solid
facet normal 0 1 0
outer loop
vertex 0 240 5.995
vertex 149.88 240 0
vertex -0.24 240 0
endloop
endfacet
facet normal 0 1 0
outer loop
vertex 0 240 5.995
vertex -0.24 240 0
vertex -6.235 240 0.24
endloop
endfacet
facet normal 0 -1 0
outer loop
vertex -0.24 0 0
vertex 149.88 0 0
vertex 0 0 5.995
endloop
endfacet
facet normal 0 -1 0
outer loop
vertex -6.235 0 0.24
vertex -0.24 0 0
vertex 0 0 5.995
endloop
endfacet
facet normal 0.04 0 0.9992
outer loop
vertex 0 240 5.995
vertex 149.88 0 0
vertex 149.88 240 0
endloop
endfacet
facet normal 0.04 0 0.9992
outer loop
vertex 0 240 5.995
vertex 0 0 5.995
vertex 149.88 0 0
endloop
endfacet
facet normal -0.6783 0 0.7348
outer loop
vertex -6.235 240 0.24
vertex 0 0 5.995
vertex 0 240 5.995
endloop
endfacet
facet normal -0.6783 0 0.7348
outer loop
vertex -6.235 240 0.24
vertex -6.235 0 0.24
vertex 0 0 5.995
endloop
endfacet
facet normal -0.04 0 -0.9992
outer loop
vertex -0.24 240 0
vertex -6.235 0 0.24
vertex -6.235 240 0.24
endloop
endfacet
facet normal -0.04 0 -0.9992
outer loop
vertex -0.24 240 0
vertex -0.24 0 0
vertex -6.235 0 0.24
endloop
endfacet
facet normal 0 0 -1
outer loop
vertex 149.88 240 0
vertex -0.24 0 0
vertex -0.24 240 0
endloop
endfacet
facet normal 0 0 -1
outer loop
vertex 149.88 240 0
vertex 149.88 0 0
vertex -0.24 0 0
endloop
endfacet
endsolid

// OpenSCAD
// bodenplatte.scad
// Side profile: two right triangles sharing a vertical 6 mm edge.
// Red triangle:  top edge 6 mm, vertical edge 6 mm, 90deg between them, hypotenuse y.
// Green triangle: bottom edge 150 mm, vertical edge 6 mm, hypotenuse x (long taper to the tip).
// All units in millimeters.

// ---------- Parameters ----------
base_length = 150;  // bottom edge of the green triangle (V -> tip)
height      = 6;    // shared vertical edge between the two triangles
top_length  = 6;    // horizontal top edge of the red triangle (A -> P)
depth       = 240;  // extrusion depth of the part

orientation = "cnc";  // "print" = base_length edge on the floor, "cnc" = x edge (long taper face) on the floor

draft_mode  = true;             // fast render while developing
$fn         = draft_mode ? 30 : 60;

// ---------- Computed (the missing values from the sketch) ----------
x = sqrt(base_length * base_length + height * height); // long taper edge
y = sqrt(top_length * top_length + height * height);   // red hypotenuse
taper_angle = atan(height / base_length);              // slope of the x edge, ~2.29 deg

echo(str("x (long taper edge) = ", x, " mm"));
echo(str("y (red hypotenuse)  = ", y, " mm"));

// ---------- Profile (side view, origin at V = bottom of the shared edge) ----------
//  A(-top_length, height) ---- P(0, height)
//        \                      |\____
//       y \                     |6    ‾‾‾‾----____ x
//          \                    |                 ‾‾‾‾----____
//           ‾‾‾‾--- V(0, 0) ----+------------ base_length ----- T(tip)
profile_points = [
    [-top_length, height],   // A: top-left
    [0,           height],   // P: top of shared edge
    [base_length, 0],        // T: tip
    [0,           0]         // V: bottom of shared edge
];

// ---------- Part ----------
module profile_2d() {
    polygon(profile_points);
}

// flipped upside down and rotated by the taper angle so the x edge lies flat at y = 0
module profile_2d_cnc() {
    translate([0, height * cos(taper_angle)])
        rotate(-taper_angle)
            mirror([0, 1])
                profile_2d();
}

module bodenplatte(orient = orientation) {
    // profile drawn in XZ (side view), extruded along Y, resting face on the build plate / machine bed
    translate([0, depth, 0])
        rotate([90, 0, 0])
            linear_extrude(height = depth)
                if (orient == "cnc")
                    profile_2d_cnc();
                else
                    profile_2d();
}

bodenplatte();
